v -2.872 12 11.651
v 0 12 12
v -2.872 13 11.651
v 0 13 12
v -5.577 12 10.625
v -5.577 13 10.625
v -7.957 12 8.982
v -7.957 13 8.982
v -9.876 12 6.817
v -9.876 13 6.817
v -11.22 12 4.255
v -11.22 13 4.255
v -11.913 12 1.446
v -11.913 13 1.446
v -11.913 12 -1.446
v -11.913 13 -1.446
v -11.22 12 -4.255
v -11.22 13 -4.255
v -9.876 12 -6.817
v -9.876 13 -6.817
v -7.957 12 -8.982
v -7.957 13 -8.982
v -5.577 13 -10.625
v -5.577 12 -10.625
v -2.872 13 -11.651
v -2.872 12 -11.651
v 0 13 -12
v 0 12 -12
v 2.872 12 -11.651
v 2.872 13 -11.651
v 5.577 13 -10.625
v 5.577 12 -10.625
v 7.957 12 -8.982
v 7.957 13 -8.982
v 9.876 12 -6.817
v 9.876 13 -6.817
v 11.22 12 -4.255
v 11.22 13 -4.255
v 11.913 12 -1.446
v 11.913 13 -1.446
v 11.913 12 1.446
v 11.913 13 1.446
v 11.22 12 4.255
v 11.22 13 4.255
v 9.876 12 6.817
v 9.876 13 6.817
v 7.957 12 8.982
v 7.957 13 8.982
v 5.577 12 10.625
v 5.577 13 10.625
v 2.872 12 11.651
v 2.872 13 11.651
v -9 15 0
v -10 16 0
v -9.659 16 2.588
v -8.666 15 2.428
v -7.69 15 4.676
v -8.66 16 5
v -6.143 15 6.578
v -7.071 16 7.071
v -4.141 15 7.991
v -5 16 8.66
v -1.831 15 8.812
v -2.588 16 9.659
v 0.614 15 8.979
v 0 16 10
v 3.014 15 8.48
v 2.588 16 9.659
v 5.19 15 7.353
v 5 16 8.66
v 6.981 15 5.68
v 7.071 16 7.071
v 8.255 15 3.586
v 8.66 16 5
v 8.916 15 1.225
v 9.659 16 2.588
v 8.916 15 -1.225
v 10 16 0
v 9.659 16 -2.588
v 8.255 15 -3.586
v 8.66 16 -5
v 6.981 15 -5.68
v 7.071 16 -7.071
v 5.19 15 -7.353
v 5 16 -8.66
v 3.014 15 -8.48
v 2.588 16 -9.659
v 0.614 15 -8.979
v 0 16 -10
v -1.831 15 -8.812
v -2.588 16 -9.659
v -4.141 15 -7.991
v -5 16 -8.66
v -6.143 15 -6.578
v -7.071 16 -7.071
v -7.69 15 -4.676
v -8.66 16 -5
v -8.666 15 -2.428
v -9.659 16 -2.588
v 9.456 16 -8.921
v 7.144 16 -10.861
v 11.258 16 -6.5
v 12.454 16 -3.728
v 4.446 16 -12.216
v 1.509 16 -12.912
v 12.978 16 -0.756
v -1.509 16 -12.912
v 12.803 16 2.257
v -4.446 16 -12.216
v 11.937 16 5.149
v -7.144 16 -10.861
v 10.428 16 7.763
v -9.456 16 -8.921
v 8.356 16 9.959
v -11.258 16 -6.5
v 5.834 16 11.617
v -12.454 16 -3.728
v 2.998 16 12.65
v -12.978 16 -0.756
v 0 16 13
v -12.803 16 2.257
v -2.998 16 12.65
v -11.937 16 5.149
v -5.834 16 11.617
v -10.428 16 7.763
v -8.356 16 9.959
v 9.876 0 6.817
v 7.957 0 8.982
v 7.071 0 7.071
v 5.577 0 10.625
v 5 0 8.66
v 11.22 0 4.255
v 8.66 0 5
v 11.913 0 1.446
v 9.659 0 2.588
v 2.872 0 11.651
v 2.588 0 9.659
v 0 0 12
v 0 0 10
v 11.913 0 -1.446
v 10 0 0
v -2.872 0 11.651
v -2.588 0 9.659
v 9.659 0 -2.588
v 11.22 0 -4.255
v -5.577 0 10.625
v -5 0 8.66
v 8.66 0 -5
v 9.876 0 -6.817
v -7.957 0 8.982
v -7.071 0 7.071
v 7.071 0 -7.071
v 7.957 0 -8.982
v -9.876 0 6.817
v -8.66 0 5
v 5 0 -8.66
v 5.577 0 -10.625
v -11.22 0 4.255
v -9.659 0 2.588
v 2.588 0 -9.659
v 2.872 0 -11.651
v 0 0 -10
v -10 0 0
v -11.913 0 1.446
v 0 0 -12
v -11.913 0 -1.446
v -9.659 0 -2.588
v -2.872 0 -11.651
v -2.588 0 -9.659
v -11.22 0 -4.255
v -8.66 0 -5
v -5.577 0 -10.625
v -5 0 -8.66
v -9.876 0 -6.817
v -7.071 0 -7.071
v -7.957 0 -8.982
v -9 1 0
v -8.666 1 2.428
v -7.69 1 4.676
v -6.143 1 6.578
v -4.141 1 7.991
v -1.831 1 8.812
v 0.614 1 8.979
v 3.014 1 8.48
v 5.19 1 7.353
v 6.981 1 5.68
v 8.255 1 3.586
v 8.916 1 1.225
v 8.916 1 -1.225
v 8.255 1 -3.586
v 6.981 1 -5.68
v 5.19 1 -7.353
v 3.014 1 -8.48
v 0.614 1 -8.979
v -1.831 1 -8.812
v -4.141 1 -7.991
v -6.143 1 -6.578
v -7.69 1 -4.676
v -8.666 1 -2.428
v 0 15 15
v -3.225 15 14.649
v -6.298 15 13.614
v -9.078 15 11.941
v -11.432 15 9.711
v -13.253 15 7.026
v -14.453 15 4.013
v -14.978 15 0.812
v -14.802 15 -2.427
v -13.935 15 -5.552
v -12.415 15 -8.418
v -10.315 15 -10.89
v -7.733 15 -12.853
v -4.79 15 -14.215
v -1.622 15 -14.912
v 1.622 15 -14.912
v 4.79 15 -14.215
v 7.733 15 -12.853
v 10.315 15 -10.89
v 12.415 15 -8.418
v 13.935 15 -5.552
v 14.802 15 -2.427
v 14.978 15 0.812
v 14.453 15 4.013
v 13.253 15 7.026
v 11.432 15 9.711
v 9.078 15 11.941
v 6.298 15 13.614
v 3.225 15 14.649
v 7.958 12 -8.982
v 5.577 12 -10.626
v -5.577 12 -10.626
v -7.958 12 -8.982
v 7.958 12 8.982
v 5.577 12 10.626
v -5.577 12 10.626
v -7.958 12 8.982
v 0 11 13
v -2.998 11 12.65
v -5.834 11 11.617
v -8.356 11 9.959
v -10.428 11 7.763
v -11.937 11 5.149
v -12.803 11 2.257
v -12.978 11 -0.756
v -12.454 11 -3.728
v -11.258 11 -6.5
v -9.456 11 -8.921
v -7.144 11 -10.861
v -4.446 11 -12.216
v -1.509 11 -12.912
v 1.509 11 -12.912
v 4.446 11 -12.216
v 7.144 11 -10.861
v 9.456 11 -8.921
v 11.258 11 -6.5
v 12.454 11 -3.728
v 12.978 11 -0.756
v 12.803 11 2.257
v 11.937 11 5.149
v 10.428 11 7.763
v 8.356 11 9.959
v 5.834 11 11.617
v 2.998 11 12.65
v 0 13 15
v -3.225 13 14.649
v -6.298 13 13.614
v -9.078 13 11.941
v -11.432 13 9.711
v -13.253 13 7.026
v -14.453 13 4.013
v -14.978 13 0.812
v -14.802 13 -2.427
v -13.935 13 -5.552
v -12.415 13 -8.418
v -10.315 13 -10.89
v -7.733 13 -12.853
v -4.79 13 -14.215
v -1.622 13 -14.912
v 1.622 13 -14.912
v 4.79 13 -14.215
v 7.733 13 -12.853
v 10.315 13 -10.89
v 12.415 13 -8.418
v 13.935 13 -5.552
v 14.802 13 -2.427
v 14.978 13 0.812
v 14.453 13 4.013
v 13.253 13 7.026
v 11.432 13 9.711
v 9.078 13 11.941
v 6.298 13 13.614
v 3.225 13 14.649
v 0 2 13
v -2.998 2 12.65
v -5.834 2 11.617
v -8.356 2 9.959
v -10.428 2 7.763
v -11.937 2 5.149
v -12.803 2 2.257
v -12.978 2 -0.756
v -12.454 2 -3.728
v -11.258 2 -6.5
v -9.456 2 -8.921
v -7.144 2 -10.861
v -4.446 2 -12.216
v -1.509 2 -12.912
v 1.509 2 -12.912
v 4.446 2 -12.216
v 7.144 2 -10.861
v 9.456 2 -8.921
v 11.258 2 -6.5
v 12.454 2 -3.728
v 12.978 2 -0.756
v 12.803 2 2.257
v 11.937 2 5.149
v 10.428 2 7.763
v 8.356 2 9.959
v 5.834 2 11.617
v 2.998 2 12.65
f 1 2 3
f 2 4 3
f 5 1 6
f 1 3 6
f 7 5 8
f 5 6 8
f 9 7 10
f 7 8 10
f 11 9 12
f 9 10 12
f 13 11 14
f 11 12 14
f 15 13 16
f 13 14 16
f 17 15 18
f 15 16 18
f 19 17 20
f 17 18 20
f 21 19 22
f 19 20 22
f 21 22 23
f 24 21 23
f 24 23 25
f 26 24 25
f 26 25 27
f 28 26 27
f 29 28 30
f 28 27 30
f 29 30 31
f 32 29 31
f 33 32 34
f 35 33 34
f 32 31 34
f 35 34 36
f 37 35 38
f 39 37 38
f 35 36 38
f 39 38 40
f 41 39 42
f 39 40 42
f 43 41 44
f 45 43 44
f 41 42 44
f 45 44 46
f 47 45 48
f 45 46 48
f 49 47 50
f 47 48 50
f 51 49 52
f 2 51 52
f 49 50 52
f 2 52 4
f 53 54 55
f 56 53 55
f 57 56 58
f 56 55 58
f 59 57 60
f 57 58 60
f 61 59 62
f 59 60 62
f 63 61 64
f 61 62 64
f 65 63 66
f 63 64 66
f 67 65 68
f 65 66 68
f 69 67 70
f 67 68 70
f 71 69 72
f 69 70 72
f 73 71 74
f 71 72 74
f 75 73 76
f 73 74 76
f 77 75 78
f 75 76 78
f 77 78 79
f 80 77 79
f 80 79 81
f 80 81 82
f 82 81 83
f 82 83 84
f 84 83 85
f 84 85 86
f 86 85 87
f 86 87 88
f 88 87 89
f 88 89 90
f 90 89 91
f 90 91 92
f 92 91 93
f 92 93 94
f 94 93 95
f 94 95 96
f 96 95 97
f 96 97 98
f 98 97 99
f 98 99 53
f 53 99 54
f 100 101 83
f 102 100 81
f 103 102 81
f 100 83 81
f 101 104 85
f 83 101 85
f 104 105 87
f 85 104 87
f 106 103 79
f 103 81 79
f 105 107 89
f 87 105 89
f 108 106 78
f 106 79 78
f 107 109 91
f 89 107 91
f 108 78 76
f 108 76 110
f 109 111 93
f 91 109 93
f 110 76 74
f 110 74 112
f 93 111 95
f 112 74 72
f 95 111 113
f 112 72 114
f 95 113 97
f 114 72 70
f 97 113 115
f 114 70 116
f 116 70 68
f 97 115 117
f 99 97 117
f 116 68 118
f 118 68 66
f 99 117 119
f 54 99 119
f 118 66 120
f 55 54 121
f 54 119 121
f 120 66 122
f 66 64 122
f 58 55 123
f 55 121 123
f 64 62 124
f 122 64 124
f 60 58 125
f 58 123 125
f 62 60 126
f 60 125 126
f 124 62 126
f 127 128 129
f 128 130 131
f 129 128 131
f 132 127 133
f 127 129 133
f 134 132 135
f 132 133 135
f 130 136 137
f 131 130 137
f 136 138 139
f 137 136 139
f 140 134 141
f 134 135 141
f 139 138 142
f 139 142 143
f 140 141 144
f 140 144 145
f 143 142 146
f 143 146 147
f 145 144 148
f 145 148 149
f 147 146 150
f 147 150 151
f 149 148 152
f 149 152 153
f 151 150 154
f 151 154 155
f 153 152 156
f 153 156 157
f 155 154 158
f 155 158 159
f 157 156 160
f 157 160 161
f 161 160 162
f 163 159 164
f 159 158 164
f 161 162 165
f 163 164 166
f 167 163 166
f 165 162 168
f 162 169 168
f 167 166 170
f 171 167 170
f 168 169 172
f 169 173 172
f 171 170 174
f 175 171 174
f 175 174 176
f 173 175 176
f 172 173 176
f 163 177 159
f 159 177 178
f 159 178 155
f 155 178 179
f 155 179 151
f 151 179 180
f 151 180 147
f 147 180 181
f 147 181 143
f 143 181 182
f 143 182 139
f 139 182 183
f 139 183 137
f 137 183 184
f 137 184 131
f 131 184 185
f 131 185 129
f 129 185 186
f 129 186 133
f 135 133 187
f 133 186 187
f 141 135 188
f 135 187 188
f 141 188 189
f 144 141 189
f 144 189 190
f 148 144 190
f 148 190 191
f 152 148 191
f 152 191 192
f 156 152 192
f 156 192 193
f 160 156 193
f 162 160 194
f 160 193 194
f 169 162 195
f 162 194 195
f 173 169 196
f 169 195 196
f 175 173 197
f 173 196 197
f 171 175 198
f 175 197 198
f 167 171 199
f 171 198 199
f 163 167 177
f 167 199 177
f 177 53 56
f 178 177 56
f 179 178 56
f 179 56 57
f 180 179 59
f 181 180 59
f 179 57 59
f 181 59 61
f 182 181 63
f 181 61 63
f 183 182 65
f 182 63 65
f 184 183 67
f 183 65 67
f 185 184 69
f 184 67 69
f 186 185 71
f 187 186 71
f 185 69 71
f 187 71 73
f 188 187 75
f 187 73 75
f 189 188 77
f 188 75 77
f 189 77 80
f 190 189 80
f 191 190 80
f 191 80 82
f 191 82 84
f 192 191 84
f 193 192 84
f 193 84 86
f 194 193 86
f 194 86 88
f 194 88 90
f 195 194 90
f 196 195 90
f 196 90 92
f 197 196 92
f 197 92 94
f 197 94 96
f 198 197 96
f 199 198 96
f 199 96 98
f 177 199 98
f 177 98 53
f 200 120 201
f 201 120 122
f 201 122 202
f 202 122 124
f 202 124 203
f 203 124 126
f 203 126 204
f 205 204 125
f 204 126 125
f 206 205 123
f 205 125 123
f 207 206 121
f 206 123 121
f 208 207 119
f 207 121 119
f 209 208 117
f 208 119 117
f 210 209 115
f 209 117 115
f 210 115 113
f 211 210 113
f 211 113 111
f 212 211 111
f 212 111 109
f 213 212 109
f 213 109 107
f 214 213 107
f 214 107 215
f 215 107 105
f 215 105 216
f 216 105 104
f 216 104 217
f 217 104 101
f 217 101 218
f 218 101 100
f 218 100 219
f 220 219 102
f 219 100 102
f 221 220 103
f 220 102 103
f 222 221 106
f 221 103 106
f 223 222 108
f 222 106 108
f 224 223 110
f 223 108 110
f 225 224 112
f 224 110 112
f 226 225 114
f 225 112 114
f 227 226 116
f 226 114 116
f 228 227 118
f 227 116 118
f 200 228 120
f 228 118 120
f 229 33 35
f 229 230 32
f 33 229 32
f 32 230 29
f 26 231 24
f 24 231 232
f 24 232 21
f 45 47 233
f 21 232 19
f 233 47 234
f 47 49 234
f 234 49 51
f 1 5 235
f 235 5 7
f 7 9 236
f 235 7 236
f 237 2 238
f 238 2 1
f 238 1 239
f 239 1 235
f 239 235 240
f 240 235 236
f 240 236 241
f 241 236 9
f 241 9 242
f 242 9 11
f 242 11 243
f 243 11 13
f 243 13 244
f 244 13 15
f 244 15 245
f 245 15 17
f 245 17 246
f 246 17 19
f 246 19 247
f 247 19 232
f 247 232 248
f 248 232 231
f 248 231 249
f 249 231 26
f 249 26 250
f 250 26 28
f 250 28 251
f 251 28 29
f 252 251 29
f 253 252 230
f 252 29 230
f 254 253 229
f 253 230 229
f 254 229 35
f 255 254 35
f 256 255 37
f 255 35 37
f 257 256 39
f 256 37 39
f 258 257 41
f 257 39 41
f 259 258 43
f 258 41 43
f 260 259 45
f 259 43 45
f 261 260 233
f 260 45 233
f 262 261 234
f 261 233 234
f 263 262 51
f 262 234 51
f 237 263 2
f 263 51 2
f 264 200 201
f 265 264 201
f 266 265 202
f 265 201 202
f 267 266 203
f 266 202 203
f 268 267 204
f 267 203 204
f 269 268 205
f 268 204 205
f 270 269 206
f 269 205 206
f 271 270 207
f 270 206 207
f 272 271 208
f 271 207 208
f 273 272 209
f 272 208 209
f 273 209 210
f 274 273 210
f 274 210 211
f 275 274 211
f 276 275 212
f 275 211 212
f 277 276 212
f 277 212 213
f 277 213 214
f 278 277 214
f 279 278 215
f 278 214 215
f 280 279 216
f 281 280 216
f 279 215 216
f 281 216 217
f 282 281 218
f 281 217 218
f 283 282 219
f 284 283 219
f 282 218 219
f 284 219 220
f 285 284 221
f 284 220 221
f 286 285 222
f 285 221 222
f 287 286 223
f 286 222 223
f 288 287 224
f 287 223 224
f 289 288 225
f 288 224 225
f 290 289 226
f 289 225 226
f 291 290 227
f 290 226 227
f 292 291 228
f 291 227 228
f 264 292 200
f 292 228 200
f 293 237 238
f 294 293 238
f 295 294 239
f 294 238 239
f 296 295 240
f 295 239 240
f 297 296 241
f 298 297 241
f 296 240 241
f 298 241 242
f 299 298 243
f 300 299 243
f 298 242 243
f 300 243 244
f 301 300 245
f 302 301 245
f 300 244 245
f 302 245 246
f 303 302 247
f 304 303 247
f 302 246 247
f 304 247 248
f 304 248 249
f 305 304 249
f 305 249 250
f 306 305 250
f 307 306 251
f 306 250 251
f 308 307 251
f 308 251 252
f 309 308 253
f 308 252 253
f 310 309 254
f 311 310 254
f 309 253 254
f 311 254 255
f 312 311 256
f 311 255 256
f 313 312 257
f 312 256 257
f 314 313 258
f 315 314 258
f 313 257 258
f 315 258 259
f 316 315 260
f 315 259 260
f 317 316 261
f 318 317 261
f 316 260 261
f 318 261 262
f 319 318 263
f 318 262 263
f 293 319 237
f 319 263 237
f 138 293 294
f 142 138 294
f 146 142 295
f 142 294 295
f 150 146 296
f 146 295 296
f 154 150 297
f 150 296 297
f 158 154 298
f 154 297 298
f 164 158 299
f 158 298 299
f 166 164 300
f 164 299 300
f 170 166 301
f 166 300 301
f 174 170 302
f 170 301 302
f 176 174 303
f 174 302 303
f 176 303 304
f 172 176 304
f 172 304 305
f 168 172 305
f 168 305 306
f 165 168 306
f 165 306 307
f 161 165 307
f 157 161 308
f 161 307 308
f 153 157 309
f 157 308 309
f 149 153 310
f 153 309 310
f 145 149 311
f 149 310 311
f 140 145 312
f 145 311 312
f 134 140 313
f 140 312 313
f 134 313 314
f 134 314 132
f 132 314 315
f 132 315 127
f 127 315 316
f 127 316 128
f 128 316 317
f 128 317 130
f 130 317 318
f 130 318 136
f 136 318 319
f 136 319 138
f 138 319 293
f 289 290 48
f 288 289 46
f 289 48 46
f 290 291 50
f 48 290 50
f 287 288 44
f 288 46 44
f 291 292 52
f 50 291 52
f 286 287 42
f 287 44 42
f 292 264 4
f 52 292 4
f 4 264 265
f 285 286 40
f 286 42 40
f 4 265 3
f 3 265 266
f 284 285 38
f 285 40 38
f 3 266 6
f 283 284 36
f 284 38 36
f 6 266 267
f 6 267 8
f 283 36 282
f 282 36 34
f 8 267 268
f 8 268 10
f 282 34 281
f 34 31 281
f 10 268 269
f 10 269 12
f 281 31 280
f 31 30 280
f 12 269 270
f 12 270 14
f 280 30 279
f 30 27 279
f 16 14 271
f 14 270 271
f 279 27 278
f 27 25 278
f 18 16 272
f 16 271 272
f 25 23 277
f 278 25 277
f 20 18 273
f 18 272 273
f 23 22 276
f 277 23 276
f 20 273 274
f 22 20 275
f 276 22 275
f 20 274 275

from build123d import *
from OCP.BRepFilletAPI import BRepFilletAPI_MakeChamfer

# Parameters (mm, degrees)
SKETCH_2_R          = 9
CUT_EXTRUDE_1_DEPTH = 27.570660511
CHAMFER_1_SIZE      = 1
CHAMFER_1_SIZE2     = 2
CHAMFER_2_SIZE      = 1


with BuildPart() as part:
    # 草图1 → 旋转1 (revolve)
    with BuildSketch(Plane.XY, mode=Mode.PRIVATE) as revolve_1_sk:
        Polygon((0, 0), (13, 0), (13, 12), (12, 12), (12, 13), (15, 13), (15, 16), (0, 16), align=None)
    revolve(revolve_1_sk.sketch.rotate(Axis((0, 16, 0), (0, -1, 0)), 90), axis=Axis((0, 16, 0), (0, -1, 0)))

    # 草图2 → 切除-拉伸1 (cut, through all)
    with BuildSketch(Plane(origin=(0, 16, 0), x_dir=(1, 0, 0), z_dir=(0, 1, 0))):
        with Locations(Location((0, 0, 0), (0, 0, 180))):
            Circle(SKETCH_2_R)
    extrude(amount=-CUT_EXTRUDE_1_DEPTH, mode=Mode.SUBTRACT)

    # 倒角1: one chamfer whose edges measure the first distance from different faces: ONE call of the kernel's chamfer builder (chamfer() names one face for all edges)
    chamfer_1_edges_1 = [part.edges().sort_by_distance(p)[0] for p in [
        (0, 16, -15),
    ]]
    chamfer_1_side_1 = [part.faces().sort_by_distance(p)[0] for p in [
        (0, 14.5, -15),
    ]]
    chamfer_1_edges_2 = [part.edges().sort_by_distance(p)[0] for p in [
        (0, 0, -13),
    ]]
    chamfer_1_side_2 = [part.faces().sort_by_distance(p)[0] for p in [
        (0, 0, -12.632304474),
    ]]
    chamfer_1 = BRepFilletAPI_MakeChamfer(part.part.solid().wrapped)
    for e in chamfer_1_edges_1:
        chamfer_1.Add(CHAMFER_1_SIZE, CHAMFER_1_SIZE2, e.wrapped, chamfer_1_side_1[0].wrapped)  # the first distance lies on this face
    for e in chamfer_1_edges_2:
        chamfer_1.Add(CHAMFER_1_SIZE, CHAMFER_1_SIZE2, e.wrapped, chamfer_1_side_2[0].wrapped)  # the first distance lies on this face
    add(Compound.cast(chamfer_1.Shape()), mode=Mode.REPLACE)

    # 倒角2
    chamfer_2_edges = [part.edges().sort_by_distance(p)[0] for p in [
        (9, 0, 0),
        (9, 16, 0),
        (0, 12, -13),
    ]]
    chamfer(chamfer_2_edges, length=CHAMFER_2_SIZE - 0.0001)  # a hair under: the kernel refuses the full size


solid = part.part
